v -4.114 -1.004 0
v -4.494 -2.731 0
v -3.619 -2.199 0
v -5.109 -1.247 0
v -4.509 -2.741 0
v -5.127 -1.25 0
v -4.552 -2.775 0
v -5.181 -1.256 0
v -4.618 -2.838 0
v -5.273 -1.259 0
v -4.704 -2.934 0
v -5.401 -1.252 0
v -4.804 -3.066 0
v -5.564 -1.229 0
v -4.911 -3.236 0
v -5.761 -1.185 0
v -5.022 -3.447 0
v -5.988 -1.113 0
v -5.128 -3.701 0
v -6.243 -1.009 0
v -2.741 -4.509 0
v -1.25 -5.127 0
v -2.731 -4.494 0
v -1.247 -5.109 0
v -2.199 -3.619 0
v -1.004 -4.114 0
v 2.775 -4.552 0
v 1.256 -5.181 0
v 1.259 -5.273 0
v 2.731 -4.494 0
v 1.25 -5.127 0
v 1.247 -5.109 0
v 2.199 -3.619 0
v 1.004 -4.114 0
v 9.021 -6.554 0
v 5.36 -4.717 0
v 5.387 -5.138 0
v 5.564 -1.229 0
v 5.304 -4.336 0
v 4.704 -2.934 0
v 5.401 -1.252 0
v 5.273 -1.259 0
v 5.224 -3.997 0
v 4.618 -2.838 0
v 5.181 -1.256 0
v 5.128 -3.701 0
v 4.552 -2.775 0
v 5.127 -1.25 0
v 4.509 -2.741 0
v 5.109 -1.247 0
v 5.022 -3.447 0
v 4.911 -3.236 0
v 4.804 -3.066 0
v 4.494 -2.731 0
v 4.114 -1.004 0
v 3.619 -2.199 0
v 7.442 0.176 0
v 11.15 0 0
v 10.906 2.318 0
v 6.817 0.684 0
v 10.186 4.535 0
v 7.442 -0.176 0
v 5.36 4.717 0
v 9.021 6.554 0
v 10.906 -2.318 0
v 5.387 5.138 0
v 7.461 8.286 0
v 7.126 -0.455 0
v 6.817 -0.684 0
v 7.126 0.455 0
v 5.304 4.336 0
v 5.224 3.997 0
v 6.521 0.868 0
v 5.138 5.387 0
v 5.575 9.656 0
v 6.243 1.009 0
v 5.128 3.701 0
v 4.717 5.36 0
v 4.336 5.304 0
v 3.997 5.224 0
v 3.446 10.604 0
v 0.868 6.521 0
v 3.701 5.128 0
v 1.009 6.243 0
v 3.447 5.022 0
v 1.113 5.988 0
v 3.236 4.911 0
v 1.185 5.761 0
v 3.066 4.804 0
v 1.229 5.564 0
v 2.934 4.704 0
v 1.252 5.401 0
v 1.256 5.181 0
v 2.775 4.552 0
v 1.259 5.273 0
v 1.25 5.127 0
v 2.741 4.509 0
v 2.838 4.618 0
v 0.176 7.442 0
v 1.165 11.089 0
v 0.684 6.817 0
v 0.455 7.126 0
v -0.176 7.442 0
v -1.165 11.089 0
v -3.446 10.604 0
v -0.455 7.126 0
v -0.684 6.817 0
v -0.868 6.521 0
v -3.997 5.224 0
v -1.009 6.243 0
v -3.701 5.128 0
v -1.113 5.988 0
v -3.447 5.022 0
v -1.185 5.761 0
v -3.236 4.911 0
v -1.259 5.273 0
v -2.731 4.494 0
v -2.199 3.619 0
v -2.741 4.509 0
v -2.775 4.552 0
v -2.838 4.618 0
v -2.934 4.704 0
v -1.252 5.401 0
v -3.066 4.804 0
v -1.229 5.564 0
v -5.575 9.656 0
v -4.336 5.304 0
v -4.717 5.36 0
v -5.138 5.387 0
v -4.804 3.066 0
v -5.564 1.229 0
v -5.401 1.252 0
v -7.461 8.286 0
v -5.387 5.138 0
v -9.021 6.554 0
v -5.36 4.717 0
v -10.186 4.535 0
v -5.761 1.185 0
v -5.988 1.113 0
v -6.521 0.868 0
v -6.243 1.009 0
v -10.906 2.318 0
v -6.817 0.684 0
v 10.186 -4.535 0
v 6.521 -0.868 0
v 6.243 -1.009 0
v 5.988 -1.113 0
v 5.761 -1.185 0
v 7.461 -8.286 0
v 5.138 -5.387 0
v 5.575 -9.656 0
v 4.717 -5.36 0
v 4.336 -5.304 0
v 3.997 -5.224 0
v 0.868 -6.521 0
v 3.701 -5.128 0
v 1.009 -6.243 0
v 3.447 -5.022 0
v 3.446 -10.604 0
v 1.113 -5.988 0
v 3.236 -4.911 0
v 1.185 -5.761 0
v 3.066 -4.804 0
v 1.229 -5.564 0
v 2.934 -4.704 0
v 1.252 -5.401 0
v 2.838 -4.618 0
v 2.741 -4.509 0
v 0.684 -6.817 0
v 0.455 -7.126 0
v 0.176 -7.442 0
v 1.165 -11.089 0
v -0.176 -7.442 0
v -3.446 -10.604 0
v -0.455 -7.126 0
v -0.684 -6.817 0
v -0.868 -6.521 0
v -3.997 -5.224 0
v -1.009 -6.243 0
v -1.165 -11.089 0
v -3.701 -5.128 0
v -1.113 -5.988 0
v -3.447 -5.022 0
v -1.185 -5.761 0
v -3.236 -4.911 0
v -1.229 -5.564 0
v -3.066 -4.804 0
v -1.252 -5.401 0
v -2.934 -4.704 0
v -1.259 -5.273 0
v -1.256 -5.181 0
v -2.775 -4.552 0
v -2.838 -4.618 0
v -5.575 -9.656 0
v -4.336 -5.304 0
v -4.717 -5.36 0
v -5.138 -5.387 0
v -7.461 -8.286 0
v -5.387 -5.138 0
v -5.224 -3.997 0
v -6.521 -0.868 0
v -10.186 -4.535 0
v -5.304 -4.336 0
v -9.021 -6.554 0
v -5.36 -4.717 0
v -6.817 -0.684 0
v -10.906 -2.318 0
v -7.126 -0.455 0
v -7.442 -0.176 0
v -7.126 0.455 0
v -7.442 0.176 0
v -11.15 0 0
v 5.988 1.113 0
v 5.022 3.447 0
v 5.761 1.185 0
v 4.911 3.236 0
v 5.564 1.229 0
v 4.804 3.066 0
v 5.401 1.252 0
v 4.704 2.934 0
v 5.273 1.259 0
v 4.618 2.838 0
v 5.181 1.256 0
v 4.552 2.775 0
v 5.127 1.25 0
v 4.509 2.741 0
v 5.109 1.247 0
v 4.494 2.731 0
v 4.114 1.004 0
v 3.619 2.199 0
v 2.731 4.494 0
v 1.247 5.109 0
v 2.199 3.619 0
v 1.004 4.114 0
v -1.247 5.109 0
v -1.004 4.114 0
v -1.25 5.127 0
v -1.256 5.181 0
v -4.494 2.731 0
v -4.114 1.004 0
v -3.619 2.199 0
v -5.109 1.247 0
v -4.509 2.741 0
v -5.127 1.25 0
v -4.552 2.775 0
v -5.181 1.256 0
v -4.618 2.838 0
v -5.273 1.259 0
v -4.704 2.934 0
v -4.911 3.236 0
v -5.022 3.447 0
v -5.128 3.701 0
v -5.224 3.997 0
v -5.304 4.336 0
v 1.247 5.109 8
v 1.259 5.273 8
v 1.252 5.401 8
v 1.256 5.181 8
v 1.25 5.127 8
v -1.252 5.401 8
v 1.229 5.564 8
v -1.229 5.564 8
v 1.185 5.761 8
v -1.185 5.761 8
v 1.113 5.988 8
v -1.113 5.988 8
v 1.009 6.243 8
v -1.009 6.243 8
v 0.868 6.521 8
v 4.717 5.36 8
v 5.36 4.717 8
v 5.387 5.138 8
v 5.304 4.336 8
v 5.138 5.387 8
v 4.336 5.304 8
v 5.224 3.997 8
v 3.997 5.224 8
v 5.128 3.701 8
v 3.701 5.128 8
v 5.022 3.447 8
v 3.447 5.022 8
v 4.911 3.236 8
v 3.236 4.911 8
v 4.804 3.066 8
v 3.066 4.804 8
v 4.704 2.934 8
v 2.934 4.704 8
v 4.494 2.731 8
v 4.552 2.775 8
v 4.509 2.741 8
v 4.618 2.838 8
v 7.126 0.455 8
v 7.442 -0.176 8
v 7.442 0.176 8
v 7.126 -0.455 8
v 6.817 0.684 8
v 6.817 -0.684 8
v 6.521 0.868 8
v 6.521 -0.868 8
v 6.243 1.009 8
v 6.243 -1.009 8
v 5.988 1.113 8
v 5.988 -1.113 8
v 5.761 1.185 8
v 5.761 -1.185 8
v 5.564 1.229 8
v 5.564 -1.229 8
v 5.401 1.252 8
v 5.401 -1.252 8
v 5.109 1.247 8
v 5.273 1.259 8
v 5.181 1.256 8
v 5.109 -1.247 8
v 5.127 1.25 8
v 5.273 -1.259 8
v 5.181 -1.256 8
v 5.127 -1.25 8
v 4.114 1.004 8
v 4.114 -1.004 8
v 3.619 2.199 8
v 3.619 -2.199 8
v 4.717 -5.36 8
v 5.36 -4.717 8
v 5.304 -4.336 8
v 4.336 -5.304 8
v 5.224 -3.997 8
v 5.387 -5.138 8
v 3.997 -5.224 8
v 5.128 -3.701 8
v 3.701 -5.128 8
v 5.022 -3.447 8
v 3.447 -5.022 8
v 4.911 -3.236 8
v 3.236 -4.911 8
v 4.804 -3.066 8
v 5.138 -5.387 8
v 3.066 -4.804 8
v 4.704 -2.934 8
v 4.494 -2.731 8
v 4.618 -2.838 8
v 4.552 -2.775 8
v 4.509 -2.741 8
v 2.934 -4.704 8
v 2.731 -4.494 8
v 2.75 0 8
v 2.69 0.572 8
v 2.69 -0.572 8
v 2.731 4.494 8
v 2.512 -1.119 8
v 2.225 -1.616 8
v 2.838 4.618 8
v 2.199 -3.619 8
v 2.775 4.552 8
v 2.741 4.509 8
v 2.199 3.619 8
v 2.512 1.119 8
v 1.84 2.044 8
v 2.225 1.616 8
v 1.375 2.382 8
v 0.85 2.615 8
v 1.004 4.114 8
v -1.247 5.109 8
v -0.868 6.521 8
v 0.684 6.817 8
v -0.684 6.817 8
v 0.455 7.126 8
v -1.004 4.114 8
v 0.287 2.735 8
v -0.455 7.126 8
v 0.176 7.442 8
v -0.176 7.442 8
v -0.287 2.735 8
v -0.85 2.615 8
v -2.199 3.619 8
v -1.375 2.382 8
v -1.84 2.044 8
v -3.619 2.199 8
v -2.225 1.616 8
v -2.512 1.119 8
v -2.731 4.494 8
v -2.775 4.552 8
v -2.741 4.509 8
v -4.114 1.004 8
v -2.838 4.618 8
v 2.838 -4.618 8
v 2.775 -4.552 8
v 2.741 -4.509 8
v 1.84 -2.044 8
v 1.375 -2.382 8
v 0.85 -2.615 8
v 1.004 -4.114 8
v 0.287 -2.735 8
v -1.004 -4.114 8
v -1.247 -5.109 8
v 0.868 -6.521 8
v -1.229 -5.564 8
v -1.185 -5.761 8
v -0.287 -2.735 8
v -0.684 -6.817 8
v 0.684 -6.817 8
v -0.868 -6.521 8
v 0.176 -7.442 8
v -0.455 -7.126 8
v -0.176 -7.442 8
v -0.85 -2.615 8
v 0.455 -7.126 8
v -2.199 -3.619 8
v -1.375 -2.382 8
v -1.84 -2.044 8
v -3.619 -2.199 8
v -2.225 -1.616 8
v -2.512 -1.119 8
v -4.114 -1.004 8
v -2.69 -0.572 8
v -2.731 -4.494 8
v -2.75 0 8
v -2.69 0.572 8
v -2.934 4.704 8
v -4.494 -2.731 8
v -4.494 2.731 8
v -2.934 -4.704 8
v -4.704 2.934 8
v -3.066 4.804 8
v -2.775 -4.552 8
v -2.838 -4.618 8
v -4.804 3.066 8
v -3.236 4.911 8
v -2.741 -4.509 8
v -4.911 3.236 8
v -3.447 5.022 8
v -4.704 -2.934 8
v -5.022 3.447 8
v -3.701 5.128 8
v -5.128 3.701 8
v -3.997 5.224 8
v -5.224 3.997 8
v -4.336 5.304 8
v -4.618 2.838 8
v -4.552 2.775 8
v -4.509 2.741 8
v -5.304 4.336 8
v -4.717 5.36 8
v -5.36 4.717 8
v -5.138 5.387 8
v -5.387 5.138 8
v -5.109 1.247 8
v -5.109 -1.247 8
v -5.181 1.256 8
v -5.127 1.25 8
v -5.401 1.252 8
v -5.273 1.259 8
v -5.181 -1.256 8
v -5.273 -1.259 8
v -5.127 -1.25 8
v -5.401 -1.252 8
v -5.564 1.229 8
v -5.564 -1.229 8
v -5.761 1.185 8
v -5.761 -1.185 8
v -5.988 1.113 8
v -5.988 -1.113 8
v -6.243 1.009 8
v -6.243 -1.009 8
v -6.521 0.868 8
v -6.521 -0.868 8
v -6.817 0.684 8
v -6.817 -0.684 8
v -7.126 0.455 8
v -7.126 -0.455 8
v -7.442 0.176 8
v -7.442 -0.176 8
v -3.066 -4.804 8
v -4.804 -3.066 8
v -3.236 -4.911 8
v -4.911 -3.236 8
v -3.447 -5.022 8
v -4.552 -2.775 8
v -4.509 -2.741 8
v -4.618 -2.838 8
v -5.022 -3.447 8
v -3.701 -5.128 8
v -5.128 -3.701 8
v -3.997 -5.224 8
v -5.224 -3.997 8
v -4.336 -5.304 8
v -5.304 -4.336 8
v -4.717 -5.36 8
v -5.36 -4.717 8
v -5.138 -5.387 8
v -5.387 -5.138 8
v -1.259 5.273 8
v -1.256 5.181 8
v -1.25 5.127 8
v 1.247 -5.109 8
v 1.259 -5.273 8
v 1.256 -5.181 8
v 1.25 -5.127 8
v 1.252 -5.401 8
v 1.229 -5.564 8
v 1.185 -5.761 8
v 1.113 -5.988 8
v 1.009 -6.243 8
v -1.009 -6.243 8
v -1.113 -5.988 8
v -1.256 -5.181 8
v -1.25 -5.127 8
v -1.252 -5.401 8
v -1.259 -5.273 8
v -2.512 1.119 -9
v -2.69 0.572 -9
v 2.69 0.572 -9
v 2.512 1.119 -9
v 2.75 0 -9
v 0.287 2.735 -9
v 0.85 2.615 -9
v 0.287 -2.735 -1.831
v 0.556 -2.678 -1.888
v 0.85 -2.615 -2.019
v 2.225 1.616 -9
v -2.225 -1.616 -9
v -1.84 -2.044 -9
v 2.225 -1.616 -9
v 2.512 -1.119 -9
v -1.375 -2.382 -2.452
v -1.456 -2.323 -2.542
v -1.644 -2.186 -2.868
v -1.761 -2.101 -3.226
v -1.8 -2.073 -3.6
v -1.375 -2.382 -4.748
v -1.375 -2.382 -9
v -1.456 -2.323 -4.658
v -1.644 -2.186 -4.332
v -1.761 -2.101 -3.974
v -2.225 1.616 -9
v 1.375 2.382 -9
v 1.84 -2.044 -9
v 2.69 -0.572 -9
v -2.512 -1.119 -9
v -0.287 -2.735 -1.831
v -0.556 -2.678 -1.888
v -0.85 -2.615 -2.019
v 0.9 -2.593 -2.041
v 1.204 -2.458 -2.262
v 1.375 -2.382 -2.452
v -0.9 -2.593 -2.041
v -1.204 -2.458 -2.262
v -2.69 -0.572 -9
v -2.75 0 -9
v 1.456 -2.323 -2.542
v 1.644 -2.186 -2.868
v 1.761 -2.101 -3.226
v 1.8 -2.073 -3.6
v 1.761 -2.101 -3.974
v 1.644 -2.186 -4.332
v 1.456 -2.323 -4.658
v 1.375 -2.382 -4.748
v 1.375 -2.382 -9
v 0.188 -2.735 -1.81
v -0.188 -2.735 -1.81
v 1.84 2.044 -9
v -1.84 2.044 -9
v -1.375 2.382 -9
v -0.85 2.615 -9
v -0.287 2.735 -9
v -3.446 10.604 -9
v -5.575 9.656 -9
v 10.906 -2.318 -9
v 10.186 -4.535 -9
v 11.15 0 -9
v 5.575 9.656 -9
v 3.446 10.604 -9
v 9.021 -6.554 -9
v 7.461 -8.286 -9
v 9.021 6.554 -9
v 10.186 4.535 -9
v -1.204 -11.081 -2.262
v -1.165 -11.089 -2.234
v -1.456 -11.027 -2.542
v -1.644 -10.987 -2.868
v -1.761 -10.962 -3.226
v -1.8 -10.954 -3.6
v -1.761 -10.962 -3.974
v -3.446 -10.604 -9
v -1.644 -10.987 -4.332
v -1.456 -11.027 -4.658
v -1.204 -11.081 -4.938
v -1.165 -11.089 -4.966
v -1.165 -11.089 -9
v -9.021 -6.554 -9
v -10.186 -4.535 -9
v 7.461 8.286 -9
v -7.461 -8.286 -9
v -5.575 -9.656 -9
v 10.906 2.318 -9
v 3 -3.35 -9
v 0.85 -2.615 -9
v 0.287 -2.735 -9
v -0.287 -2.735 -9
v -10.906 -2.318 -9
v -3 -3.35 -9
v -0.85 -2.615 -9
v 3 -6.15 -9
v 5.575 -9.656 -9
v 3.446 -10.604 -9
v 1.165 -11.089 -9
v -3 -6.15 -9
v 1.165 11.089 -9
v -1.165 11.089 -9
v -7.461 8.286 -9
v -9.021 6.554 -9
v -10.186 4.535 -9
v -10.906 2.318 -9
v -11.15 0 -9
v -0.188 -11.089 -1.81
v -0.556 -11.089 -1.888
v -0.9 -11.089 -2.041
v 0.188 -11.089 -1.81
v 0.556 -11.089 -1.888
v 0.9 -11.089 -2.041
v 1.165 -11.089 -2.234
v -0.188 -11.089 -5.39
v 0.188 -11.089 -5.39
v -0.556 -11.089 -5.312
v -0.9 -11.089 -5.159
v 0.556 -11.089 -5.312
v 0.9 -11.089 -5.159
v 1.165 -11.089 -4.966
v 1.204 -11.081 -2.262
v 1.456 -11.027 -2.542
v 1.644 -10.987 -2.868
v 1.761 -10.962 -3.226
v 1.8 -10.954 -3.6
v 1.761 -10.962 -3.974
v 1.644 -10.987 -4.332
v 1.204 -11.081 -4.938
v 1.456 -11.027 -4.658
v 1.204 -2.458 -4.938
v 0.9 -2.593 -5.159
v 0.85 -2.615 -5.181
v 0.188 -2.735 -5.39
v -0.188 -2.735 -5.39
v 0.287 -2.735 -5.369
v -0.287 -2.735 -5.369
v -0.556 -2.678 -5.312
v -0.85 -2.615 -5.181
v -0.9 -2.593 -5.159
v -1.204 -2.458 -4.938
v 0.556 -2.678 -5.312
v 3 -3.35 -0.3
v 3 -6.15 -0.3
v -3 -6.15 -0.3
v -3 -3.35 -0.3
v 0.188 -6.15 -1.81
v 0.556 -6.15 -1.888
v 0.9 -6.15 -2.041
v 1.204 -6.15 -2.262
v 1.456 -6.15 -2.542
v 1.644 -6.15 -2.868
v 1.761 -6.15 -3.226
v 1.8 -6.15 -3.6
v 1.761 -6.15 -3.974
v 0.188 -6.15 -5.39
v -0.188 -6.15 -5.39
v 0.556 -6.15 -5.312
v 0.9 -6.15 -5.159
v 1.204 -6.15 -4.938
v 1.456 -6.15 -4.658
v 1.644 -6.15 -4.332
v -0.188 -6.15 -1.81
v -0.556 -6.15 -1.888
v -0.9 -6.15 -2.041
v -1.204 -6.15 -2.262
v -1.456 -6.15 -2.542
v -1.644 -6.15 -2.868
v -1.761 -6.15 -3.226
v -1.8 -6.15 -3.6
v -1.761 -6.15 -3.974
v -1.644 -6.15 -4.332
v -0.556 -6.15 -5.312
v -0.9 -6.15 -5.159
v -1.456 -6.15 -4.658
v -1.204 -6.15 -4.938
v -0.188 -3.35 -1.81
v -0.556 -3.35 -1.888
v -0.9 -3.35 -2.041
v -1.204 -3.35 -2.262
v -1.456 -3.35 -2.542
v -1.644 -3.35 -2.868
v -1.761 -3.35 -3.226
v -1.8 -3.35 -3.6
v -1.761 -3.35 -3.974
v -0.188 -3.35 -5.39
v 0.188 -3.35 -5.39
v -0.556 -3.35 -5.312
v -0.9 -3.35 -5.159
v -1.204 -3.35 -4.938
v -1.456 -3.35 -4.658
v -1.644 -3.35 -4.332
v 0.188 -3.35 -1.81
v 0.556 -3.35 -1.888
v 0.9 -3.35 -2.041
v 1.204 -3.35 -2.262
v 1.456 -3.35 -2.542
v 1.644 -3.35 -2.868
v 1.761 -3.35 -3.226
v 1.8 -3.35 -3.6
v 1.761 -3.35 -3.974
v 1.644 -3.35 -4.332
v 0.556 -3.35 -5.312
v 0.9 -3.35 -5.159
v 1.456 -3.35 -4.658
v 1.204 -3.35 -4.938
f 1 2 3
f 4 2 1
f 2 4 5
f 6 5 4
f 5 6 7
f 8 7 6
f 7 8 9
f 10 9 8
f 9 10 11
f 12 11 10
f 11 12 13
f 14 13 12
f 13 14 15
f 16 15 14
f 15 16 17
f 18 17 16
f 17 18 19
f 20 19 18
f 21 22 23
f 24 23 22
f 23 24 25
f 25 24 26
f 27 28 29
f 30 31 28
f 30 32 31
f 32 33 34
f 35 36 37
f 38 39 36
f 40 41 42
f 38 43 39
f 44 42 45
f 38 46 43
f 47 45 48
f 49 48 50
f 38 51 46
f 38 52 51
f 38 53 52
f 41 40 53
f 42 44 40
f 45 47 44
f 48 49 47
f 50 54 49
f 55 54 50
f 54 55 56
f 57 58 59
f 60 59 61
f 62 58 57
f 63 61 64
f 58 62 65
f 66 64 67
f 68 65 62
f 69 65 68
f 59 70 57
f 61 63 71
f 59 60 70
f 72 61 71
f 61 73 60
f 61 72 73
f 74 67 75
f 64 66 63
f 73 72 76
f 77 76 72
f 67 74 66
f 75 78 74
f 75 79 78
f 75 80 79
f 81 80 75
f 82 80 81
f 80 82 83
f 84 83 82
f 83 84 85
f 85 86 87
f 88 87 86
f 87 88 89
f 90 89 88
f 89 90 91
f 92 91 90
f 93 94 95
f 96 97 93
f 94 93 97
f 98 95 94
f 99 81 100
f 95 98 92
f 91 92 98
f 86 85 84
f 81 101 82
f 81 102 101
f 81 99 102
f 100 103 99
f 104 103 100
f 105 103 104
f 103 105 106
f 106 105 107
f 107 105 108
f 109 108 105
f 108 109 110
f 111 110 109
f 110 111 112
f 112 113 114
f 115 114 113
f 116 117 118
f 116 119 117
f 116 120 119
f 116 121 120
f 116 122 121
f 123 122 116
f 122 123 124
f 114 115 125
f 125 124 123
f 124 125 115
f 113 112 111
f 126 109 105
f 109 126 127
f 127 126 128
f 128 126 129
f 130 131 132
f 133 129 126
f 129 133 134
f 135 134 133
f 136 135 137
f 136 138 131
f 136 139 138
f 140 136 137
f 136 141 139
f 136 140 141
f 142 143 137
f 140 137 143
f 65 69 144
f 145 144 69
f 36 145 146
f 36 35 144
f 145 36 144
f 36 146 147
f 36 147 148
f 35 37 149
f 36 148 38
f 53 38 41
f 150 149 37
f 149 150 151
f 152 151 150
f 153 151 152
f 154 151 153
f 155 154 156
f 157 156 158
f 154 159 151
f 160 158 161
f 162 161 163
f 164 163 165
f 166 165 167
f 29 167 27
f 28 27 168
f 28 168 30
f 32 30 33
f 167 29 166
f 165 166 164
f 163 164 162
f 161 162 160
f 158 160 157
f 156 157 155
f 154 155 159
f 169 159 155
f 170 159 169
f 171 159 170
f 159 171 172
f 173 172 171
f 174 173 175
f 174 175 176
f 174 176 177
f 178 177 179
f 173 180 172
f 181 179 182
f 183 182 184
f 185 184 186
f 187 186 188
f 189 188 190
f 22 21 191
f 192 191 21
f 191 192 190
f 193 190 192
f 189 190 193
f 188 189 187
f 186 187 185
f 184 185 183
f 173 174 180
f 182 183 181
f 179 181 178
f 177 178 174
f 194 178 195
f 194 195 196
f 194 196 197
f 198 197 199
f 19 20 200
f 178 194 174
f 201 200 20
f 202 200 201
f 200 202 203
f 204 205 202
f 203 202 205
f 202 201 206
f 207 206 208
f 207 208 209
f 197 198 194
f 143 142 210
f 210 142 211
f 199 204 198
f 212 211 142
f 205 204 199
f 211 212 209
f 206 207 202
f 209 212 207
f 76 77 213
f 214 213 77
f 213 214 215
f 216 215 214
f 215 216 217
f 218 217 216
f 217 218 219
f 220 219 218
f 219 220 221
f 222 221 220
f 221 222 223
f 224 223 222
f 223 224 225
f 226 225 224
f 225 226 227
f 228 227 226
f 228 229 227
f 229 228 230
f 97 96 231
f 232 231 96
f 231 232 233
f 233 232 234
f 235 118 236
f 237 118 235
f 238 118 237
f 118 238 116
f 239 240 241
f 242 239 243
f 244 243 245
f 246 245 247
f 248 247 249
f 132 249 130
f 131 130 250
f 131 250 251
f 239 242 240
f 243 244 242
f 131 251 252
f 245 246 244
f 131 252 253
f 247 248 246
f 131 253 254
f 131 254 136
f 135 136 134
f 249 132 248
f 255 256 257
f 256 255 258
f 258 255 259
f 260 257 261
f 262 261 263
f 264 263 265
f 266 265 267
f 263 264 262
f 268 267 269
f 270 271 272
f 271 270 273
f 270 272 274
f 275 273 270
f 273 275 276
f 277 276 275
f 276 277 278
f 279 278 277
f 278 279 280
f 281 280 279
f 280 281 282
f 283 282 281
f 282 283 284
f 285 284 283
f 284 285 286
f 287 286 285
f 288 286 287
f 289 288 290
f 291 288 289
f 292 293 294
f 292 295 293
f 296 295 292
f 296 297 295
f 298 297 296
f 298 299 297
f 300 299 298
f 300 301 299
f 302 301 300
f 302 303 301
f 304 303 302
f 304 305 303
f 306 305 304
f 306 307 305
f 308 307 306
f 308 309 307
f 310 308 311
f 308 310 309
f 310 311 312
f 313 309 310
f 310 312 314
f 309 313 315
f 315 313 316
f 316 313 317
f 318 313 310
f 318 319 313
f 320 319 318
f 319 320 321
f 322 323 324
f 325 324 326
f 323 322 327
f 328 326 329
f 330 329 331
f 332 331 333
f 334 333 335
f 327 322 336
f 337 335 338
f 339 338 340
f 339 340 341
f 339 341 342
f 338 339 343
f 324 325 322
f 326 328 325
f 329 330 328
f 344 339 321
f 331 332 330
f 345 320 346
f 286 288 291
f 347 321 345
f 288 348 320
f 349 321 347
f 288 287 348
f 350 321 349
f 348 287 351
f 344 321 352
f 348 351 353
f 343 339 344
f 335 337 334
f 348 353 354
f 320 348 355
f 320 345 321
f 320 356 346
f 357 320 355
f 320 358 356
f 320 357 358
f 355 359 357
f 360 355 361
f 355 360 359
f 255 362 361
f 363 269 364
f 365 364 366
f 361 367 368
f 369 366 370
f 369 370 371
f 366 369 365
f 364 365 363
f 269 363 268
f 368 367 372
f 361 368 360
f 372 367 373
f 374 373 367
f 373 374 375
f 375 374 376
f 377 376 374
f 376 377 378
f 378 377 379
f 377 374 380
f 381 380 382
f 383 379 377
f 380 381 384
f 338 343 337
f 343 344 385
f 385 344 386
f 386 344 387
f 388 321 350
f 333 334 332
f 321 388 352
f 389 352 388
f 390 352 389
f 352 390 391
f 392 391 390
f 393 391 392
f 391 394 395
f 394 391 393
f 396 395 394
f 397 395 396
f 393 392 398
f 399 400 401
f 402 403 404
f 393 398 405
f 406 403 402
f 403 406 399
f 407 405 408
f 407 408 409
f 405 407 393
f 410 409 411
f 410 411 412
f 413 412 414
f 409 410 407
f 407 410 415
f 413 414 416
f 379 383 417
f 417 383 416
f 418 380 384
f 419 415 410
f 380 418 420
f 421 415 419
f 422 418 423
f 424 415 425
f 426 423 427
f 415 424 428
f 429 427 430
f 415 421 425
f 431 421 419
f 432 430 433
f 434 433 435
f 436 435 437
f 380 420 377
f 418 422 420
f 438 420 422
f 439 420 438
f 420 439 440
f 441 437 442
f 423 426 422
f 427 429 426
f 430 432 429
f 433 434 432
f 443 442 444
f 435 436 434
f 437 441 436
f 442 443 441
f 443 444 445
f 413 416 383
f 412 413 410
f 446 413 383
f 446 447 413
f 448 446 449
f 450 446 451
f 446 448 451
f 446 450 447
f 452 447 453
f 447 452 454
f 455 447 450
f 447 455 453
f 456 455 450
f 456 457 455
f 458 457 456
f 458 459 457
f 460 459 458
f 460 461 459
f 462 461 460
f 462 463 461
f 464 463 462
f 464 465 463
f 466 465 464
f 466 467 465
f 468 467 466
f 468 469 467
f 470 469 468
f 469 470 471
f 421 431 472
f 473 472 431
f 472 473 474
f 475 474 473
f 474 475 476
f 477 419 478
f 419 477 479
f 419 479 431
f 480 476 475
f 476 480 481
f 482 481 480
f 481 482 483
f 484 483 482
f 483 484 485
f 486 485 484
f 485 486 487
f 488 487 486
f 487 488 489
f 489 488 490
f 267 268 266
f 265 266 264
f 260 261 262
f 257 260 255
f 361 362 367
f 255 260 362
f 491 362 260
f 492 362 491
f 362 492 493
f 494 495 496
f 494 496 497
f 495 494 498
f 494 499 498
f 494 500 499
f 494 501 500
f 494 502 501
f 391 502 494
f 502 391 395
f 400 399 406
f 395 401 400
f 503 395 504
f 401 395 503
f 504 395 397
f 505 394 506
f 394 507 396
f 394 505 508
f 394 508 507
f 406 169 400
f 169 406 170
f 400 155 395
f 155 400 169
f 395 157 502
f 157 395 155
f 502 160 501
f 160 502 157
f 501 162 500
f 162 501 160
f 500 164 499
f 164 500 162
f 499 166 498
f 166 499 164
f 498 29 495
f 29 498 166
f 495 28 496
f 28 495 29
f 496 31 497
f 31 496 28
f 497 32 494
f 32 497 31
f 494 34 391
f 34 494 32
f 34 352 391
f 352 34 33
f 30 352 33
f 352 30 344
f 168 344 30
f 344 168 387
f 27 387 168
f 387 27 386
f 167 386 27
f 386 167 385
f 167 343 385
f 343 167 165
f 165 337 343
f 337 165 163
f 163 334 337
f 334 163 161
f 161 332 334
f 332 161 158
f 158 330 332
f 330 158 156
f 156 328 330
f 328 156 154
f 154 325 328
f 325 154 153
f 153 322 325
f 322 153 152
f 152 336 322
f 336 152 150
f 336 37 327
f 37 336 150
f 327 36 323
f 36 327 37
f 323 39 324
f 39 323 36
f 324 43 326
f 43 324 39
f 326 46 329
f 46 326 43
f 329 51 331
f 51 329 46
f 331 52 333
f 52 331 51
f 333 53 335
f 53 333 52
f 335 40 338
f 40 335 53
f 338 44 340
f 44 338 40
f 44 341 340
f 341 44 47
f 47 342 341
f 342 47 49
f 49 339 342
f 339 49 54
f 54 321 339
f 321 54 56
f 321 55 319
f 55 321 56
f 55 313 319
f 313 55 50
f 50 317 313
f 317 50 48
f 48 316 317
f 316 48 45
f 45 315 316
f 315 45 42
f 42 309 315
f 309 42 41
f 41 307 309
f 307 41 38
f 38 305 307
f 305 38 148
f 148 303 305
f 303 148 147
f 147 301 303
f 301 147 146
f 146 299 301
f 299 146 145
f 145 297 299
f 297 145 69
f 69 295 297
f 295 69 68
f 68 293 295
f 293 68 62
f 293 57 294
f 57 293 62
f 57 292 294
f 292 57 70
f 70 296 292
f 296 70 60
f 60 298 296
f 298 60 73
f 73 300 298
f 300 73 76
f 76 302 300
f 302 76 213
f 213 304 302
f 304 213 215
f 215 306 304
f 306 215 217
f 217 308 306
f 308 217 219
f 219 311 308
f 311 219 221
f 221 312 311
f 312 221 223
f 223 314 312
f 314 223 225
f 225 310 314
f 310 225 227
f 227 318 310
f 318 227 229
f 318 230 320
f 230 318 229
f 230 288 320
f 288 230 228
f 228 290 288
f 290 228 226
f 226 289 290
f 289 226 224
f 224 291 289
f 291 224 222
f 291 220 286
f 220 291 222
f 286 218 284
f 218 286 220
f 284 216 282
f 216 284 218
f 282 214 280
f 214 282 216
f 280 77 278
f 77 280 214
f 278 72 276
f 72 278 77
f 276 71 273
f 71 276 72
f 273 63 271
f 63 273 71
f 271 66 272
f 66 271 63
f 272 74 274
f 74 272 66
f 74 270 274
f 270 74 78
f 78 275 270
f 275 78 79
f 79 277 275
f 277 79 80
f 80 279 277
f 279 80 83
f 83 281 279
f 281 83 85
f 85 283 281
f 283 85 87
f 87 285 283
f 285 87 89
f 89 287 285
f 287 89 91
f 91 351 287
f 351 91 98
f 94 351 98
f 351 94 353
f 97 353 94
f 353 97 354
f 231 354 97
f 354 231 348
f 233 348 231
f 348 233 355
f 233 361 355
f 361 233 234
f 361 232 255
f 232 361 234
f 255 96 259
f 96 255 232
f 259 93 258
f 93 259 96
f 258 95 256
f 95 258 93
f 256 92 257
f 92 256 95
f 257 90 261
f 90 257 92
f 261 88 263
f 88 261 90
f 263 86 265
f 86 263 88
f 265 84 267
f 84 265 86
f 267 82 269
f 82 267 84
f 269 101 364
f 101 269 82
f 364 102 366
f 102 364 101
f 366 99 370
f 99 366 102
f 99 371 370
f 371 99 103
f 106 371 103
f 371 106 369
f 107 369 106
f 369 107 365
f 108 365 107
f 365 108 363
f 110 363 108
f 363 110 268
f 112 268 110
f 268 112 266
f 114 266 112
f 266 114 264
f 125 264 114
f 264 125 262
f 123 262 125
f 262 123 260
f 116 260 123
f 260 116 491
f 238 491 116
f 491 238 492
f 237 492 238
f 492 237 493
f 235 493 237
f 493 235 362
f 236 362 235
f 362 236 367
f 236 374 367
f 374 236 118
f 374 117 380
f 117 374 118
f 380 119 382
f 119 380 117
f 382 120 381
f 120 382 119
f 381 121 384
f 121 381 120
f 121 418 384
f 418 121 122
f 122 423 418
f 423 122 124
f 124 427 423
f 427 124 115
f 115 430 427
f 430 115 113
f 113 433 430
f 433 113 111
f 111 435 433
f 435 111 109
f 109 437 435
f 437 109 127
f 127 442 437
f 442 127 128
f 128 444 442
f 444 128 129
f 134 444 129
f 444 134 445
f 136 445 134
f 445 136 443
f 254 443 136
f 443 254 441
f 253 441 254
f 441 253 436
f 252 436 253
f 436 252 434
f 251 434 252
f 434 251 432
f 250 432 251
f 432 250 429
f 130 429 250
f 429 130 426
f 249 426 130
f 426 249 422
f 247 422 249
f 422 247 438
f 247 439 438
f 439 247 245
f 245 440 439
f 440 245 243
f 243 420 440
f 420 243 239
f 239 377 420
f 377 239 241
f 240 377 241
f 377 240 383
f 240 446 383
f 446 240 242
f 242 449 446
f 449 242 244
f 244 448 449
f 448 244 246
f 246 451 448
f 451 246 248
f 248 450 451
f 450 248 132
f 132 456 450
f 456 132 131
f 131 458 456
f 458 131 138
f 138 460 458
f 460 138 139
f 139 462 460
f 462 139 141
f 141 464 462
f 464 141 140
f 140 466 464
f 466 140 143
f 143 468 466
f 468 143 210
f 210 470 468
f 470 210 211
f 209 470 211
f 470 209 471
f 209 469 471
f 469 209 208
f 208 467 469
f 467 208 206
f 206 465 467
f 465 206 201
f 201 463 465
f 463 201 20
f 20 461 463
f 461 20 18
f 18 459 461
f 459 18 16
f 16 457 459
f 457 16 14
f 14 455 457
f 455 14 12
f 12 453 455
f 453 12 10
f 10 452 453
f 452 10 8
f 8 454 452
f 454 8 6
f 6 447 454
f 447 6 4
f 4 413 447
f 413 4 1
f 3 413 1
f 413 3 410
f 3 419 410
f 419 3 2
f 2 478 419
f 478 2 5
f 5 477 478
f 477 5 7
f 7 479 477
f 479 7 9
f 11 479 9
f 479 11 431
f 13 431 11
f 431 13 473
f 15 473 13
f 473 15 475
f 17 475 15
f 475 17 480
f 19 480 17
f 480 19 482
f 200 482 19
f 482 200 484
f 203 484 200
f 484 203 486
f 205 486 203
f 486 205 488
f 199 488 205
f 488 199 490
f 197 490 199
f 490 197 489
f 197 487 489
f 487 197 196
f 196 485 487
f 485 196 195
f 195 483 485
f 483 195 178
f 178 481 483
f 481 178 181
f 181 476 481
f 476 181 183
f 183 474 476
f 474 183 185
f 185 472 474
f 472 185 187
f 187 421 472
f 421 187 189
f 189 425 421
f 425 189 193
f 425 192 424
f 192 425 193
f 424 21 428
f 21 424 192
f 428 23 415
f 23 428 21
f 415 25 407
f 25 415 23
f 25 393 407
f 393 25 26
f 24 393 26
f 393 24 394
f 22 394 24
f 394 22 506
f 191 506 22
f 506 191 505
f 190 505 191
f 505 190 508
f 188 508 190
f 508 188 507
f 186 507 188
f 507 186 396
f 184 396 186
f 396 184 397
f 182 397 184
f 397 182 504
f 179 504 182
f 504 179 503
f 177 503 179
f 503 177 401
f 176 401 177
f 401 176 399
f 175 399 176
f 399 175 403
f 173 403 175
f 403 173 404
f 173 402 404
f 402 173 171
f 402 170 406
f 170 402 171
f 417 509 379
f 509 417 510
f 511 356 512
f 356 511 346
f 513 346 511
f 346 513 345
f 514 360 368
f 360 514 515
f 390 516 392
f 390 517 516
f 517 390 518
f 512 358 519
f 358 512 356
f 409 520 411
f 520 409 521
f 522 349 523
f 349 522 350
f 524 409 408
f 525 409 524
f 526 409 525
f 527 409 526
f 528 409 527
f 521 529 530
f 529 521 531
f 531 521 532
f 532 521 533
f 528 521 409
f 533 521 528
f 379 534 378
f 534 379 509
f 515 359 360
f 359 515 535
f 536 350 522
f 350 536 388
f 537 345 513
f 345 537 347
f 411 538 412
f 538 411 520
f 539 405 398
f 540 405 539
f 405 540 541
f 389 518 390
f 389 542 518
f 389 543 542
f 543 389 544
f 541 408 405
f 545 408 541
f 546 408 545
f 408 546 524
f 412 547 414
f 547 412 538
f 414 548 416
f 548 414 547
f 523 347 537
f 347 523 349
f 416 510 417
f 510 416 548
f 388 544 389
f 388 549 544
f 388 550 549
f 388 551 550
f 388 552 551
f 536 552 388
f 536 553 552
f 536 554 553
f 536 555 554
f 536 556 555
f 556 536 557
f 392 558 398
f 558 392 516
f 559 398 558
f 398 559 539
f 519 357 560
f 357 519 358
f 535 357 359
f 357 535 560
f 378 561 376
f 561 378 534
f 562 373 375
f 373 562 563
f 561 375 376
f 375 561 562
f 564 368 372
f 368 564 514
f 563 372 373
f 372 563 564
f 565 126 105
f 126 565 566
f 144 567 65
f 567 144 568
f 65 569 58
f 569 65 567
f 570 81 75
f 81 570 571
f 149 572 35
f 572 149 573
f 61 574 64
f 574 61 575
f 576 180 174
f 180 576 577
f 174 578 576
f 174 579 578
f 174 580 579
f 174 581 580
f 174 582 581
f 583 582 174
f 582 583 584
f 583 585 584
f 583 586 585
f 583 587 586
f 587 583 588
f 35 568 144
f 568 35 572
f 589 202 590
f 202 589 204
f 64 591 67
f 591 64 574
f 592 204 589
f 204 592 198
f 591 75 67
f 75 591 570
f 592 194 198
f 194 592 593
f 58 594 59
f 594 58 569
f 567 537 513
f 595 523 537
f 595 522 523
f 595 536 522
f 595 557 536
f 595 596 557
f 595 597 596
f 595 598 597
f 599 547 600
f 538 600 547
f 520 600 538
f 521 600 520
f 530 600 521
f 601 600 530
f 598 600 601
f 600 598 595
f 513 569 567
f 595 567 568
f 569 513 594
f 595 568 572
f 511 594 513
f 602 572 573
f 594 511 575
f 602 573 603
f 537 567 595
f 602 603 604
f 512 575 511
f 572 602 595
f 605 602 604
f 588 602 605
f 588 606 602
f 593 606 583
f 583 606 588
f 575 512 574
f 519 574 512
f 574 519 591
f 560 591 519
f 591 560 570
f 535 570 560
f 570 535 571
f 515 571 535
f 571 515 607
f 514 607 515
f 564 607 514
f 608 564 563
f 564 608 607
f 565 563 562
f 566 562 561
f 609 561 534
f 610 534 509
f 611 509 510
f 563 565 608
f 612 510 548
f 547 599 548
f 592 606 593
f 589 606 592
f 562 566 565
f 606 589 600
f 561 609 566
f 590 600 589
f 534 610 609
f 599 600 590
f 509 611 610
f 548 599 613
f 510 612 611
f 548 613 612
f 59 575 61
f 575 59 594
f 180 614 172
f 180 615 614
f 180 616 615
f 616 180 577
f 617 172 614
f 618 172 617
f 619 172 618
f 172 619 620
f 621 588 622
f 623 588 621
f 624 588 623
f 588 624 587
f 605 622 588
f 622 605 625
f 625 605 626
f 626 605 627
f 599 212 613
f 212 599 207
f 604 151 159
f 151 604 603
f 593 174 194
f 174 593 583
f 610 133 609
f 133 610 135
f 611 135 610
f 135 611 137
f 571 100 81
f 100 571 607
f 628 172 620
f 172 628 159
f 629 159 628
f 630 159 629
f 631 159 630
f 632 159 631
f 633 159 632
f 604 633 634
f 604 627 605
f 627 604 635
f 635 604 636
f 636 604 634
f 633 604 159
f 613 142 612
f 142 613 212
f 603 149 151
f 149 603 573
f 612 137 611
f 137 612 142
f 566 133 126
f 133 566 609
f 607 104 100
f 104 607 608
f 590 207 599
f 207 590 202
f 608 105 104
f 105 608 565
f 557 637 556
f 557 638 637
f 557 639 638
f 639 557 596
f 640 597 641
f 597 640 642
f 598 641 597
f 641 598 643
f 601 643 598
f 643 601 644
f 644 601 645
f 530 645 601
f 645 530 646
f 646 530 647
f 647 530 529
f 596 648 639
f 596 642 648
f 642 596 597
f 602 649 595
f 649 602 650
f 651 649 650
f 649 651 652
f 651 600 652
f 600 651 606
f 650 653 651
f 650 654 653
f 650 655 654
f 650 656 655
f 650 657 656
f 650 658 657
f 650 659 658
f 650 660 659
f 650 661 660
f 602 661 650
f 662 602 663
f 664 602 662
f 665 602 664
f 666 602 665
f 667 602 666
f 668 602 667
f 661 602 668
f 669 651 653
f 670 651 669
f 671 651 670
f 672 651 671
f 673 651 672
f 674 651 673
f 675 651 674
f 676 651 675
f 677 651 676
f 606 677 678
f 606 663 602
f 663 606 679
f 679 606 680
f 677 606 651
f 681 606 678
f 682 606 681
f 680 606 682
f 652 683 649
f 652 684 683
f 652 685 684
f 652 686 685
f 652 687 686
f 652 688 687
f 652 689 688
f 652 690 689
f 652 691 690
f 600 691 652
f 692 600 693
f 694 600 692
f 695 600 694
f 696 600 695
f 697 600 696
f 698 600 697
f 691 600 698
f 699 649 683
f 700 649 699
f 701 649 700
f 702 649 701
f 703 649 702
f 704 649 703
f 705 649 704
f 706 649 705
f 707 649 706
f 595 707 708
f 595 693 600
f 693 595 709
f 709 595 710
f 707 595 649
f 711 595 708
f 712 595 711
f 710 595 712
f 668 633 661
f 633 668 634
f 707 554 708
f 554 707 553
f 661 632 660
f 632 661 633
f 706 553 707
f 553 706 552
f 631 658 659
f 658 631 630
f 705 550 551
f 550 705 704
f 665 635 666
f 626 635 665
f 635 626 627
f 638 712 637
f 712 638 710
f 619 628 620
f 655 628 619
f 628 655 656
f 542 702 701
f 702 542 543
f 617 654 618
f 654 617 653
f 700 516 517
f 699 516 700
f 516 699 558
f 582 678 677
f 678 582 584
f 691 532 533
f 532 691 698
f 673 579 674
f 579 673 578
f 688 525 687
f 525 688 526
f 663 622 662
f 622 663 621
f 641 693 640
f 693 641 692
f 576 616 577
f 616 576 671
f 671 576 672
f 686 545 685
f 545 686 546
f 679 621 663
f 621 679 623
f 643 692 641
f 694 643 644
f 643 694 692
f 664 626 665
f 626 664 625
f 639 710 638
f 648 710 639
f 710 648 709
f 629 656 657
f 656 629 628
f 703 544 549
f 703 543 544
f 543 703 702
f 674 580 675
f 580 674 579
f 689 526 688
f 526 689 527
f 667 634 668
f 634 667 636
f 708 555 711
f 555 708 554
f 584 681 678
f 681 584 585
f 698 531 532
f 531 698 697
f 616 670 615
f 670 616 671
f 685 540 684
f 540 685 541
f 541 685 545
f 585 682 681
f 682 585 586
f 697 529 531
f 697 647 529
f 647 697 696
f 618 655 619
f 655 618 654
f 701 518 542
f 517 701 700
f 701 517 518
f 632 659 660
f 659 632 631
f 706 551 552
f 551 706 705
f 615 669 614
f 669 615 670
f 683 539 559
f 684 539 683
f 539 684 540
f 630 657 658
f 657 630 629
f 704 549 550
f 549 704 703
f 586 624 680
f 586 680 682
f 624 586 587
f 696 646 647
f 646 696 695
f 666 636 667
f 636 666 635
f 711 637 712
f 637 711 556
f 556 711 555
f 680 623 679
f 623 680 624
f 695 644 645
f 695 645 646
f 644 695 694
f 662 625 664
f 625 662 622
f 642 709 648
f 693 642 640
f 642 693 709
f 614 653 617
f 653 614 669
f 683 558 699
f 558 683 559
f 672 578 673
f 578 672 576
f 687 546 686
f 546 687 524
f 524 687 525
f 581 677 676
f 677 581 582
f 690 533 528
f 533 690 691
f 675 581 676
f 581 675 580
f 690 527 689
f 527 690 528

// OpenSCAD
/*
    gear.scad

	A drive gear for NEMA17 motor.

    Copyright (C) 2019  John Winans

    This program is free software: you can redistribute it and/or modify
    it under the terms of the GNU General Public License as published by
    the Free Software Foundation, either version 3 of the License, or
    (at your option) any later version. 

    This program is distributed in the hope that it will be useful,
    but WITHOUT ANY WARRANTY; without even the implied warranty of
    MERCHANTABILITY or FITNESS FOR A PARTICULAR PURPOSE.  See the
    GNU General Public License for more details.

    You should have received a copy of the GNU General Public License
    along with this program.  If not, see <https://www.gnu.org/licenses/>.
*/
    
    
    
/*  
    Official source and documentation:
        https://github.com/johnwinans/DecagonReelClock
*/


use <MCAD/involute_gears.scad>

m5bore=5.6;
m3bore=3.4;
m3nbore=6.5;        // countersink diameter for an M3 hex nut

$fs=2;
bore_countersink_dia=9.5;       // head countersink diameter for an M5 bolt head
bore_countersink_depth=5+1;     // countersink depth for an M5 bolt head
bore_diameter=m5bore;           // axle diameter for loose fit on an M5 bolt

nema17shaft=5.5;

involute_facets=12;	
circle_facets=7;
circular_pitch=268;



// radius of the gear pairs
rad60=pitch_radius(60, circular_pitch);
rad72=pitch_radius(72, circular_pitch);
rad12=pitch_radius(12, circular_pitch);
rad10=pitch_radius(10, circular_pitch);
rad6=pitch_radius(6, circular_pitch);
meshFudge=.15;   // extra space between gear axles

small(nema17shaft, teeth=8, $fn=20);


// Note: motor mounting is designed for a total of 38 teeth!

///*rotate([180,0,0])*/ small(nema17shaft, teeth=12);
//rotate([180,0,0]) small(m3bore, teeth=26);
//rotate([180,0,0]) small(m3bore, teeth=16);


//gear6x1();
//axleHub(10, bore_diameter, 7.5);

// test-fit things
//translate([0,0,-5]) 
//gearbox_plate(rad12+rad72+meshFudge, rad72+rad6+meshFudge, bore_diameter);
//translate([0,rad12+rad72,7]) rotate([0,0,360/72/2]) gear6x1();

//testmesh();




function pitch_radius(number_of_teeth, circular_pitch) = (number_of_teeth * circular_pitch / 180) / 2;
function tooth_angle(number_of_teeth) = 360/number_of_teeth;


module axleHub(hubdia, bore, thick)
{
    difference()
    {
        cylinder(d=hubdia, h=thick);
        translate([0,0,-.5]) cylinder(d=bore, h=thick+1);
    }
}


module gearbox_plate(rad, mrad, bore)
{
    x=120;
    y=rad*2+30;
    z=10;
    honeyrad=4;
    hubdia=honeyrad*3.5;
    mb_t=5;             // mounting block thickness
    x_inset=10;
    y_inset=10;

    difference()
    {
        union()
        {
            //translate([-x_inset,-y_inset,0]) honeycombPlate(x,y,z,rad=4,th=1.5,inset=3);
            translate([-x_inset,-y_inset,0]) cube([x,y,z]);
            axleHub(hubdia, bore, z);
            translate([0,rad,0]) axleHub(hubdia, bore, z);
            
            // mounting blocks
            translate([x-mb_t-10,-y_inset,0]) cube([mb_t,y,z]);
            translate([-x_inset,y-y_inset-mb_t,0]) cube([x,mb_t,z]);
            
            // nut access border
            for ( p = [ 90, 30 ] )
                translate([x-x_inset-p,y-y_inset-mb_t-5,z/2]) cube([15,13,z], center=true);
            for ( p = [ 20, 100 ] )
                translate([x-x_inset-mb_t-10/2,-y_inset+p,z/2]) cube([13,15,z], center=true);
        }    
        
        // nut access
        for ( p = [ 90, 30 ] )
            translate([x-x_inset-p,y-y_inset-mb_t-5,z/2]) cube([12,10,z+1], center=true);
        for ( p = [ 20, 100 ] )
                translate([x-x_inset-mb_t-10/2,-y_inset+p,z/2]) cube([10,12,z+1], center=true);
        
            
        // axle holes
        translate([0,0,-.5])cylinder(d=bore, h=z+1, $fn=30);
        translate([0,rad,-.5]) cylinder(d=bore, h=z+1, $fn=30);
        
        // back mounting blocks
        for ( p = [ 90, 30 ] )
            translate([x-x_inset-p,y-y_inset+.01,z/2]) 
                rotate([90,0,0]) cylinder(d=m3bore, h=20, $fn=20);
        
        // bottom mounting blocks
        for ( p = [ 20, 100 ] )
                translate([x-x_inset+.01,-y_inset+p,z/2]) rotate([0,-90,0]) cylinder(d=m3bore, h=20, $fn=20);
        
        // motor mounting bracket
        translate([0,rad+mrad,0]) rotate([0,0,90]) motorCore(z+1);
        translate([-x_inset,rad+mrad,0]) cube([mb_t*2,1,z]);       // flex slot
    }
    
    // nut retainers
    if (false)
    for ( p = [ 90, 30 ] )
        translate([x-x_inset-p,y-y_inset-mb_t,z/2]) rotate([90,0,0]) 
            intersection() { m3mount(); cube([20,z,10],center=true); }

    // motor mounting bracket
    translate([0,rad+mrad,0]) rotate([0,0,90]) motorClamp(25,3);

}

module gear6x1()
{
    difference()
    {
        union()
        {
            mygear($fn=20,
                bore_diameter=bore_diameter, 
                number_of_teeth=72, 
                bore_diameter=bore_diameter,
                hub_thickness=0,
                rim_width=0,            // make the circles as big as possible
                rim_thickness = 7,      // how thick the 'tire' of the gear will be
                gear_thickness = 7      // how thick the inner-wheel will be
                );

            translate([0,0,7])              // raise to the thickness of the inner-wheel
                mygear($fn=20,
                    bore_diameter=bore_diameter,
                    number_of_teeth=12, 
                    bore_diameter=bore_diameter, 
                    rim_thickness=8, 
                    hub_thickness=8
        //            hub_diameter=bore_diameter+2
                    );
        }
        if (false)
        {
            // hollow out a countersing in the hub for a bolt head
            translate([0,0,7+8-bore_countersink_depth]) cylinder(d=bore_countersink_dia, h=bore_countersink_depth+1, $fn=25);
        }
    }
}


// A rendering a two gears to see how the mesh
module testmesh()
{
    g1_teeth=60;
    g2_teeth=11;

    //g1_diameter = g1_teeth * circular_pitch / 180;
    //g2_diameter = g2_teeth * circular_pitch / 180;
    //axis_difference = g1_diameter/2 + g2_diameter/2 +meshFudge;
    
    axis_difference = (g1_teeth+g2_teeth) * circular_pitch / 360 + meshFudge;
    
    gear(number_of_teeth=g1_teeth, circular_pitch=circular_pitch);
    
    translate([axis_difference,0,0])
        rotate([0,0,(g1_teeth+g2_teeth)%2 ? 0 : 360/g2_teeth/2]) 
           gear(number_of_teeth=g2_teeth, circular_pitch=circular_pitch);
    
    
    
    // draw a reference line
    difference()
    {
        translate([-10,-10,12]) cube([axis_difference+20,20,3]);
        #cylinder(d=5, h=40, center=true, $fn=20);
        #translate([axis_difference,0,0]) cylinder(d=5, h=40, center=true, $fn=20);
    }
    //translate([0,0,10]) cube([axis_difference,5,5]);
}



/*
module mygear(
    number_of_teeth = 48,
    gear_thickness = 5,
    rim_thickness = 7,
    rim_width = 4,
    hub_thickness = 10,
    hub_diameter = 10,
    bore_diameter = 6)
{
    gear (number_of_teeth=number_of_teeth,
        circular_pitch=circular_pitch,
        gear_thickness = gear_thickness,
        rim_thickness = rim_thickness,
        rim_width = rim_width,
        hub_thickness = hub_thickness,
        hub_diameter = hub_diameter,
        bore_diameter = bore_diameter,
        circles=5,
        twist = 0,
        involute_facets = involute_facets,
        circle_facets = circle_facets);    
}
*/



module small(bore, teeth=10)
{
	difference()
    {
        union()
        {
        rotate([180,0,0]) m3GrubHubPos(axle=bore, hubZ=9, $fn=30);
		gear (number_of_teeth=teeth,
			circular_pitch=268,
			gear_thickness = 8,
			rim_thickness = 8,
			hub_thickness = 0,
			hub_diameter = 20,
			bore_diameter = bore,
			circles=0,
			twist = 0,
			involute_facets = involute_facets,
			circle_facets = circle_facets, $fn=30);
        }
        rotate([180,0,0]) m3GrubHubNeg(axle=bore, hubZ=9, $fn=30);
	}
}

//******************************************************************************
grubDia=3.6;
M3SqNutWidth=6;
M3SqNutHt=2.8;

module m3GrubHubPos(axle, hubZ)
{
    od = axle+M3SqNutHt*6;
    cylinder(d=od, h=hubZ, $fn=30);
  
}

module m3GrubHubNeg(axle, hubZ, hubRad=M3SqNutHt*4)
{
    $fn=30;
    od = axle+M3SqNutHt*2+hubRad;
    grubScrewCenter=grubDia/2+1.8;

    nutFudgeZ=0.3;  // extra depth for the nut hole
    
    // shaft hole
    translate([0,0,-.05]) cylinder(d=axle, h=hubZ*2.5);
    
    // M3 grub screw nut hole (5.5mm square nut)
    // translating to .4 in Y allows as few as 10 teeth on the gear
    translate([-(M3SqNutWidth/2), axle/2+.6, grubScrewCenter-(M3SqNutWidth/2)-nutFudgeZ]) cube([M3SqNutWidth, M3SqNutHt, hubZ+grubScrewCenter]);
    
    // M3 grub screw hole
    translate([0, od/2, grubScrewCenter]) rotate([90,0,0]) cylinder(d=grubDia, h=od, center=true);
}

module m3GrubHub(axle, hubZ=10)
{
    difference()
    {
        m3GrubHubPos(axle, hubZ);
        m3GrubHubNeg(axle, hubZ);
    }
}
